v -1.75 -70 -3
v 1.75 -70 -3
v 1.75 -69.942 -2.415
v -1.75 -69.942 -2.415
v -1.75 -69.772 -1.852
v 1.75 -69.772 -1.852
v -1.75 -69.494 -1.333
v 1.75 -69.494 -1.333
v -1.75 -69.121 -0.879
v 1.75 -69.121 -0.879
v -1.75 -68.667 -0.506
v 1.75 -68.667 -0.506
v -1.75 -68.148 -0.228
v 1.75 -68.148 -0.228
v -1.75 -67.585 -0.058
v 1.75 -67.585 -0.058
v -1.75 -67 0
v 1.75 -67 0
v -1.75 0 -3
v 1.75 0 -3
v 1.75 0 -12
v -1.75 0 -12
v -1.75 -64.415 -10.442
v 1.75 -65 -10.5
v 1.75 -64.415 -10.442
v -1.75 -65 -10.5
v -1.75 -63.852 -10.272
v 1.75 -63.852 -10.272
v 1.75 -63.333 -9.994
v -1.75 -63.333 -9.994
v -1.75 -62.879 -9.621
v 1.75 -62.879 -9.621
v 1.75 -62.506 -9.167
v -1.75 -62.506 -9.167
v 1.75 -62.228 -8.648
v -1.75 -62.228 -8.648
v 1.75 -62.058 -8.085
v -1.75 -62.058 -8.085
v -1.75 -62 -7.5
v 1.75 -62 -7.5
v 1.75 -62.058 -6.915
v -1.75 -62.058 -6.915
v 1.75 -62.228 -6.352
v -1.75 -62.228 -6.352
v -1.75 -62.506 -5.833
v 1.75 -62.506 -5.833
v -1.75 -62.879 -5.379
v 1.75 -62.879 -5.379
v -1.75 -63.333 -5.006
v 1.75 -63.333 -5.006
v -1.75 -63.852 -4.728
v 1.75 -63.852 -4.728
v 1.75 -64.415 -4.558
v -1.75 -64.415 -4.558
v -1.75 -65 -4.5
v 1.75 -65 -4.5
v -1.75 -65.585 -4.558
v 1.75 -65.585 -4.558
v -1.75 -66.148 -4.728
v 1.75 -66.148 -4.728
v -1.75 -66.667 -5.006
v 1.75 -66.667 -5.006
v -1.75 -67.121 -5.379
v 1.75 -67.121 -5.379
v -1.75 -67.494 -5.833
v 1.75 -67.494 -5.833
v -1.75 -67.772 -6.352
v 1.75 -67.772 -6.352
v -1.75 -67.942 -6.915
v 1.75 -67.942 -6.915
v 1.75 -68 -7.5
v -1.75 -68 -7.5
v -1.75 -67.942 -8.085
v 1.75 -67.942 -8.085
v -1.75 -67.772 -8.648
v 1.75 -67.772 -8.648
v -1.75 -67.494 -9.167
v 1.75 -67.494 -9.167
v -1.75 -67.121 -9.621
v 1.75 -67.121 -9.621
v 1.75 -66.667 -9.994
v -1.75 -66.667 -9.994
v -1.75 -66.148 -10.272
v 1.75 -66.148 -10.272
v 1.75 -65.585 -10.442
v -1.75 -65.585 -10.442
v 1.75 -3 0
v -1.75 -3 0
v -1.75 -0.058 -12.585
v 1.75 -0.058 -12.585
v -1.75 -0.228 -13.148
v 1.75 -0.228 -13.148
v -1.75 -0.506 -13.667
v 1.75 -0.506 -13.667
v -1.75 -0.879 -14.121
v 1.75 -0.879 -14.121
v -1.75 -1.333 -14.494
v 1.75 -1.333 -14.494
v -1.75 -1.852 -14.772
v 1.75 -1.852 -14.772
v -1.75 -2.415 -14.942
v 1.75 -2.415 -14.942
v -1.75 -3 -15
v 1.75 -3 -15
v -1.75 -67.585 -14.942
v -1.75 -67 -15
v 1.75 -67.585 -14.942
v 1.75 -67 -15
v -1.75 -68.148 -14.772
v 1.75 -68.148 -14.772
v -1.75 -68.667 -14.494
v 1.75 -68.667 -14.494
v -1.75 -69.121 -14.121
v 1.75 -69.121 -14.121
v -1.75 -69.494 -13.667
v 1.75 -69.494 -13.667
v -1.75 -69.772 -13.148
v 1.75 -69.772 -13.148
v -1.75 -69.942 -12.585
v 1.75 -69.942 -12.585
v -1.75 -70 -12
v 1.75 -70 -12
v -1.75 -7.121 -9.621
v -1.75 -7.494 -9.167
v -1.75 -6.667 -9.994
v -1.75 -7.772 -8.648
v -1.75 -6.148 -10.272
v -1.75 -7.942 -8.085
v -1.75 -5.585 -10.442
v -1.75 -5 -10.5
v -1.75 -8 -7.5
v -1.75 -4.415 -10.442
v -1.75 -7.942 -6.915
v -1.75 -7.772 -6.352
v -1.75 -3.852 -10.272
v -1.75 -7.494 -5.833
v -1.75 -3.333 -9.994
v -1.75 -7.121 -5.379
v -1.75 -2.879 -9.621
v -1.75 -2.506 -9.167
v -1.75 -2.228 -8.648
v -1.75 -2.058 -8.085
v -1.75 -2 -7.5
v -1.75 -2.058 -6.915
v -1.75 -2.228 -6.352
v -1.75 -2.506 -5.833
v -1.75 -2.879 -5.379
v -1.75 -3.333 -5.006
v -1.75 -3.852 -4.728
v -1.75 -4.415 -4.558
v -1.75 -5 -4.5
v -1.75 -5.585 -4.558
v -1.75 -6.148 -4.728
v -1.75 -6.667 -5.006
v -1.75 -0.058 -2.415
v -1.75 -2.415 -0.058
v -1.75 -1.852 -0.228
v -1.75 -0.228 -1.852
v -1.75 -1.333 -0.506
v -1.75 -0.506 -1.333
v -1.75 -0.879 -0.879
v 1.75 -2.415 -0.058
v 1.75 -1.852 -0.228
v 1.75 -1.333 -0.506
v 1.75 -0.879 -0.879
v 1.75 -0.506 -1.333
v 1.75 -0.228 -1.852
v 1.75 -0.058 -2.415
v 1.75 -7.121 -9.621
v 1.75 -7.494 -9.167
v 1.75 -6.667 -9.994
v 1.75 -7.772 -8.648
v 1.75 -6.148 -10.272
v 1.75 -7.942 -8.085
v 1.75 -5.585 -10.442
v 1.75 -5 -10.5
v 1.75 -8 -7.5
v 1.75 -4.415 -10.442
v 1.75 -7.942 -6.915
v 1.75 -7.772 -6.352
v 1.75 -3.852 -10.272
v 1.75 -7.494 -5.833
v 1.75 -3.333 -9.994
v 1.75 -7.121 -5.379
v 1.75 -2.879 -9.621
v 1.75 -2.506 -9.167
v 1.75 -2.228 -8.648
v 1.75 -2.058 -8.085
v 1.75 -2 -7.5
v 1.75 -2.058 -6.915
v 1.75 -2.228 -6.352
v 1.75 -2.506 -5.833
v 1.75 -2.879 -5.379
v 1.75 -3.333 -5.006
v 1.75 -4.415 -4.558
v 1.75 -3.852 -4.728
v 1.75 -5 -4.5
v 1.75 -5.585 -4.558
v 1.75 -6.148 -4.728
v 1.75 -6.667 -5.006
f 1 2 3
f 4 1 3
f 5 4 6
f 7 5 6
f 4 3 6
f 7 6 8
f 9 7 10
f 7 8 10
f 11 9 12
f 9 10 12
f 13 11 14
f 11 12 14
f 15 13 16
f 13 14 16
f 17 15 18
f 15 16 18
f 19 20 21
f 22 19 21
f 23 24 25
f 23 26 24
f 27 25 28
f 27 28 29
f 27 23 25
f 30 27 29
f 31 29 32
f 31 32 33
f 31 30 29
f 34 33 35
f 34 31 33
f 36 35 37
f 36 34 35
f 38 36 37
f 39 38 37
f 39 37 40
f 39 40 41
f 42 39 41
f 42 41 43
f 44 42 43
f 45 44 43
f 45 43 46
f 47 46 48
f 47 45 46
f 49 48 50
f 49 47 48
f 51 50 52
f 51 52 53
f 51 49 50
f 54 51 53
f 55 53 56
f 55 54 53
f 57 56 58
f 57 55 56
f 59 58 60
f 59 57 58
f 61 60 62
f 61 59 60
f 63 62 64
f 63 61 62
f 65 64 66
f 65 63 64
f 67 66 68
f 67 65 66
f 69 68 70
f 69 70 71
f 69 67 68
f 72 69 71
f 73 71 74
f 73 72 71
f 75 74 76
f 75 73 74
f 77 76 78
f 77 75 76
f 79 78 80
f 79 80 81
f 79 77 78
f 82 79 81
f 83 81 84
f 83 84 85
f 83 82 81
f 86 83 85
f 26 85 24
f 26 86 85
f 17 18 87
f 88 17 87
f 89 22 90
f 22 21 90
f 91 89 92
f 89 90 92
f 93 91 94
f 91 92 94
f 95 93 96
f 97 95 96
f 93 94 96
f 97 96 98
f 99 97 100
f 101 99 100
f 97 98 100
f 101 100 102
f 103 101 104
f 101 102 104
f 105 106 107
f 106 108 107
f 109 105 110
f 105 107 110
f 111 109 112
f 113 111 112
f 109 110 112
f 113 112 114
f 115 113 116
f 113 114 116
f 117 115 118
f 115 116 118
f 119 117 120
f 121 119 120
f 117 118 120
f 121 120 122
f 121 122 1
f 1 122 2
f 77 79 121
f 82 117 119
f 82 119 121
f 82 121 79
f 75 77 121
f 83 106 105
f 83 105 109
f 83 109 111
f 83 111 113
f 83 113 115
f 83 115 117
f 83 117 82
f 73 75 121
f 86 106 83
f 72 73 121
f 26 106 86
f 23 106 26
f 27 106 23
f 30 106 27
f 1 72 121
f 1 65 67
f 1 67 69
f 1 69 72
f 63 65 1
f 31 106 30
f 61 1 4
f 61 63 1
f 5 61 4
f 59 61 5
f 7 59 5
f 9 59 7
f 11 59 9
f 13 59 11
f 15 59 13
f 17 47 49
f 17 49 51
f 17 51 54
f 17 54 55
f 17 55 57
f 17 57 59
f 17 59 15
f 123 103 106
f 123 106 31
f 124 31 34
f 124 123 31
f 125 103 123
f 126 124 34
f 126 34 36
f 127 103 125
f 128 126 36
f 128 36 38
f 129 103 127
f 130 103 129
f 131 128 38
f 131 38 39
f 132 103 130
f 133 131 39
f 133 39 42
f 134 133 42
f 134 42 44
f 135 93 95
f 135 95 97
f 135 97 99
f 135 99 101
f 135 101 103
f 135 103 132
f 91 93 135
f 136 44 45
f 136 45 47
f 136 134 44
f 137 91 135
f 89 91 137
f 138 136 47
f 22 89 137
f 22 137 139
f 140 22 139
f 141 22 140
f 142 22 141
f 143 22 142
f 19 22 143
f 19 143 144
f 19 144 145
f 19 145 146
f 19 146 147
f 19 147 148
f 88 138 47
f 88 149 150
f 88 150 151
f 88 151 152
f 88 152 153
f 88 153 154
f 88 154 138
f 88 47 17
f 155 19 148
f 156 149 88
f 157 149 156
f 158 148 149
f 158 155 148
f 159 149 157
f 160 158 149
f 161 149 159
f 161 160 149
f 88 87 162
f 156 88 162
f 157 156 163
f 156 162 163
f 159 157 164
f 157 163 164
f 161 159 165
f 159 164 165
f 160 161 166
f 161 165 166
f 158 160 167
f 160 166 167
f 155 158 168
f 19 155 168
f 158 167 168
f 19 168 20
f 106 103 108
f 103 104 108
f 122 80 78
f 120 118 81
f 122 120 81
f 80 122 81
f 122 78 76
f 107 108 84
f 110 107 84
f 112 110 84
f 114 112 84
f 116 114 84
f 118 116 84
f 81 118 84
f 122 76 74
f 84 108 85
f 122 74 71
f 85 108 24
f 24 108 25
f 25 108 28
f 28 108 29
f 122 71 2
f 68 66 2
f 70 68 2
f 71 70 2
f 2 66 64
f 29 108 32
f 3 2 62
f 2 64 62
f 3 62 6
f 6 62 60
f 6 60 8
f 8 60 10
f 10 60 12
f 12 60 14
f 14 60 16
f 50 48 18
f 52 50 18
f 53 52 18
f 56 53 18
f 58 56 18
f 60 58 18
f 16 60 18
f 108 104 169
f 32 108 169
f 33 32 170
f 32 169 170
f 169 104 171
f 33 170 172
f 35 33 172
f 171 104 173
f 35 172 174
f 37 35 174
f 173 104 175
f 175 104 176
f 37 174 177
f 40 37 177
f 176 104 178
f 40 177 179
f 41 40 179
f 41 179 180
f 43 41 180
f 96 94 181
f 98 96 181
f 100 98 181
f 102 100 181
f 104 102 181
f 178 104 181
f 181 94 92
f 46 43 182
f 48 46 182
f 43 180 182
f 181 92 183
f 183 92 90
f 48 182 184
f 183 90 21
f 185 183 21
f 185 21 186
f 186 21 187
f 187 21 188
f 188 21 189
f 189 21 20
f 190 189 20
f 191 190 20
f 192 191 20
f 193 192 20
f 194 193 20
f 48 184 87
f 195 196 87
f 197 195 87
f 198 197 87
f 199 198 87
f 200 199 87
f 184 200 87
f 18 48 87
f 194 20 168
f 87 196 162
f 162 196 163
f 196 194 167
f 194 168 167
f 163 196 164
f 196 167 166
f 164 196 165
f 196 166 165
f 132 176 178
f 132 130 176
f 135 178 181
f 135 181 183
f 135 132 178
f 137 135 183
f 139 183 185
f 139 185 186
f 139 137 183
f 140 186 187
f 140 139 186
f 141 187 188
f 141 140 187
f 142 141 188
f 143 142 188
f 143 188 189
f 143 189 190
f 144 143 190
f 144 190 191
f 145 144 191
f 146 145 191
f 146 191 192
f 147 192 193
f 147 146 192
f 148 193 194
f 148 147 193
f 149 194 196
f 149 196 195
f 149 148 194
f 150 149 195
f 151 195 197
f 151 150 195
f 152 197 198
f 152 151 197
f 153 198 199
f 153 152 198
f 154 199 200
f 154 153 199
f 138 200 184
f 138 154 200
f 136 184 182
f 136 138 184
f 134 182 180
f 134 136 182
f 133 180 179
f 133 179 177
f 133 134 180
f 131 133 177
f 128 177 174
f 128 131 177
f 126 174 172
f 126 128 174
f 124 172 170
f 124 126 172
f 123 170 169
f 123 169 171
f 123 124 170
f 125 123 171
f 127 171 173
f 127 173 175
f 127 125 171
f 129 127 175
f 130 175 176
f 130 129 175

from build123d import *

# Parameters (mm, degrees)
SKETCH3_R           = 3
BOSS_EXTRUDE2_DEPTH = 1.75


with BuildPart() as part:
    # Sketch3 → Boss-Extrude2 (new, symmetric)
    with BuildSketch(Plane(origin=(0, 0, 0), x_dir=(0, 0, -1), z_dir=(1, 0, 0))):
        with BuildLine():
            Line((3, 0), (12, 0))
            ThreePointArc((12, 0), (14.121320344, -0.878679656), (15, -3))
            Line((15, -3), (15, -67))
            ThreePointArc((15, -67), (14.121320344, -69.121320344), (12, -70))
            Line((12, -70), (3, -70))
            ThreePointArc((3, -70), (0.878679656, -69.121320344), (0, -67))
            Line((0, -67), (0, -3))
            ThreePointArc((0, -3), (0.878679656, -0.878679656), (3, 0))
        make_face()
        with Locations((7.5, -5)):
            Circle(SKETCH3_R, mode=Mode.SUBTRACT)
        with Locations((7.5, -65)):
            Circle(SKETCH3_R, mode=Mode.SUBTRACT)
    extrude(amount=BOSS_EXTRUDE2_DEPTH, both=True)


solid = part.part
